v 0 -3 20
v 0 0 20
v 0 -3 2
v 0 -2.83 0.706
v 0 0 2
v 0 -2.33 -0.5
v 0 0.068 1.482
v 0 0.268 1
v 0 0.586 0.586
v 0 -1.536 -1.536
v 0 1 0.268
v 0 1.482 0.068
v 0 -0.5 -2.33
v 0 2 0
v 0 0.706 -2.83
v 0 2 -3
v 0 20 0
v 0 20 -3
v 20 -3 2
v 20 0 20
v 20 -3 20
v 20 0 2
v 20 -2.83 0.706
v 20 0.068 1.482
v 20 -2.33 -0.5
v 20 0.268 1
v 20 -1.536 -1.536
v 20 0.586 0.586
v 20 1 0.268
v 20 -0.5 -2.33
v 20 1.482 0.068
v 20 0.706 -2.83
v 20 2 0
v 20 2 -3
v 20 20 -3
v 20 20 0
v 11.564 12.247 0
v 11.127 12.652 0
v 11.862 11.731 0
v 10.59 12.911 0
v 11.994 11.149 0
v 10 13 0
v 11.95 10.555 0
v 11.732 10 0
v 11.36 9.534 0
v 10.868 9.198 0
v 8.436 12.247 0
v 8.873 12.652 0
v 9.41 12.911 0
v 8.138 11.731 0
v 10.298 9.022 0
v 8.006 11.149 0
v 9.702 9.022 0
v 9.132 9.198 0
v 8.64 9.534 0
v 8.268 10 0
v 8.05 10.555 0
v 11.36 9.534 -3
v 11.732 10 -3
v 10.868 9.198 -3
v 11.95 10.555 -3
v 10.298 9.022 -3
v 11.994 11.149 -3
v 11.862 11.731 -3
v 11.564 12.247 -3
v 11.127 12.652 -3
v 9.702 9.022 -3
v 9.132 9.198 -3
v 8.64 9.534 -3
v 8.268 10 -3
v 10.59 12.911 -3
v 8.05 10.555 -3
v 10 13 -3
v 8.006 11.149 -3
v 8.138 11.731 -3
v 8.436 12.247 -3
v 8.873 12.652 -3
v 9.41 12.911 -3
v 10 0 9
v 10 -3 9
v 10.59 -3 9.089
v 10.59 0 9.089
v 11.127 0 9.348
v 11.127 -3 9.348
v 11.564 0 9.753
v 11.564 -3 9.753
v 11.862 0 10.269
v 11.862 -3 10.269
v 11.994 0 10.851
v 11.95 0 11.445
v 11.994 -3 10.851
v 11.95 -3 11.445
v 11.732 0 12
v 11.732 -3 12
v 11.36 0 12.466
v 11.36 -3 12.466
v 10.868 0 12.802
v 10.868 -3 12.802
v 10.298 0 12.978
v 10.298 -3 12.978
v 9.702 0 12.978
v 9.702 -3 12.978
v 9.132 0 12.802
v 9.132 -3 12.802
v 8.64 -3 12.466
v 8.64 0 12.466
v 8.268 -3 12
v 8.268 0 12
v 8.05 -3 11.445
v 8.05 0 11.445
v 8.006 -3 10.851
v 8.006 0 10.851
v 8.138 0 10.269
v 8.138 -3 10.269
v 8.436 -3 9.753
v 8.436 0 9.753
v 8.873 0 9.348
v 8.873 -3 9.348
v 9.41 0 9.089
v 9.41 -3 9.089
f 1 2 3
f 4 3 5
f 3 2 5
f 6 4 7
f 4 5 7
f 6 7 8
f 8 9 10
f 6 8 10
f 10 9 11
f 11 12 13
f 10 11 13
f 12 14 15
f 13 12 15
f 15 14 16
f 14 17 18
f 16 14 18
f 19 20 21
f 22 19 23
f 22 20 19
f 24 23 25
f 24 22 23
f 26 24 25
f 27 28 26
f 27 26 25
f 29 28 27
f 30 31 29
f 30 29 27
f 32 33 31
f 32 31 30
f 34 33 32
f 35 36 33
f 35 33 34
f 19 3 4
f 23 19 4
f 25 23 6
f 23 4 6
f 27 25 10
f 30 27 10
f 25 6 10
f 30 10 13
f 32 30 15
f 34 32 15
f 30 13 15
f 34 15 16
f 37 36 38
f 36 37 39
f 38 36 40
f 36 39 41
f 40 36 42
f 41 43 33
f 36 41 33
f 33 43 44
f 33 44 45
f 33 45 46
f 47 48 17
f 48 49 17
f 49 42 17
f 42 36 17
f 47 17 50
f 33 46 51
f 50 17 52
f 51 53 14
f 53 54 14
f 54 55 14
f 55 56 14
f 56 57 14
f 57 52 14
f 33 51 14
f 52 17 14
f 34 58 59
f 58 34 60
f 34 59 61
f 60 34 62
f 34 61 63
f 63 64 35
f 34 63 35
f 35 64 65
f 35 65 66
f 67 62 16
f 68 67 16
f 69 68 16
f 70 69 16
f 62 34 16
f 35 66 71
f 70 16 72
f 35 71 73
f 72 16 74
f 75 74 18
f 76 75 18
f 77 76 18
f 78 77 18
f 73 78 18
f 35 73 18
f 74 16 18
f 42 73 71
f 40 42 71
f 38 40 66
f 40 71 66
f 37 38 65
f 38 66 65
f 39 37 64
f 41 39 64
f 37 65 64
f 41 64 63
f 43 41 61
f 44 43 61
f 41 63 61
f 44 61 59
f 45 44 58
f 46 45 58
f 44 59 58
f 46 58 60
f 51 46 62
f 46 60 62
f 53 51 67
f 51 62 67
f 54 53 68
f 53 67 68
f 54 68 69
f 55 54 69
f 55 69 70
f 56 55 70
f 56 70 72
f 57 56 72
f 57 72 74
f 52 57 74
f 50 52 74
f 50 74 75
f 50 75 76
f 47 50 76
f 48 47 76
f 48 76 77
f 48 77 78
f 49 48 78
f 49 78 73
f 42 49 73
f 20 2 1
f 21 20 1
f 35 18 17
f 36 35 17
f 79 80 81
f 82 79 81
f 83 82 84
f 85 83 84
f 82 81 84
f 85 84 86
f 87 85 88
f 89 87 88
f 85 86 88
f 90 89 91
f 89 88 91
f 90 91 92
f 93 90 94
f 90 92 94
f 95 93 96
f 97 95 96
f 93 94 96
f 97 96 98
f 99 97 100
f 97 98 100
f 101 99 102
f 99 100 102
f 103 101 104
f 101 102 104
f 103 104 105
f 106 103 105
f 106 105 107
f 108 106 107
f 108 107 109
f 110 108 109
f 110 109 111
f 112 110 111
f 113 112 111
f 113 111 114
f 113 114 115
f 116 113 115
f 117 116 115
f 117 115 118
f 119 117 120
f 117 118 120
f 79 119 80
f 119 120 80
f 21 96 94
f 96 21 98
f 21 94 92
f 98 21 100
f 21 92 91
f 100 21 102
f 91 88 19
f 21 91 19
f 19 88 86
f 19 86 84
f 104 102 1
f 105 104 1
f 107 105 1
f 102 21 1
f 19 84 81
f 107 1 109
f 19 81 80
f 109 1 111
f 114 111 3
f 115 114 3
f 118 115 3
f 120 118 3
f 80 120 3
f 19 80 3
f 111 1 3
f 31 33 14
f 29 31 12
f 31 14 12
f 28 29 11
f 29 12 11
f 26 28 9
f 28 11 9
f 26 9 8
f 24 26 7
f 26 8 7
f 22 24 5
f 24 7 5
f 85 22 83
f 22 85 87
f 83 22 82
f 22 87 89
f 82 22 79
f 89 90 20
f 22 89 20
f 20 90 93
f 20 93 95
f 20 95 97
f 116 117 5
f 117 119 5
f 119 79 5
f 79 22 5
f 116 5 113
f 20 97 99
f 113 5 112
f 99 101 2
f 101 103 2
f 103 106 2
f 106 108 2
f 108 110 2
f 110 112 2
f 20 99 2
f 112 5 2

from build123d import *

# Parameters (mm, degrees)
BASE_FLANGE1_DEPTH = 20
SKETCH6_R          = 2
CUT_EXTRUDE1_DEPTH = 10
SKETCH7_R          = 2
CUT_EXTRUDE2_DEPTH = 3


# Sheet-metal steps are written as plain solids
with BuildPart() as part:
    # Sketch1 → Base-Flange1 (new body)
    with BuildSketch(Plane(origin=(0, 0, 0), x_dir=(0, 0, -1), z_dir=(1, 0, 0))):
        with BuildLine():
            Line((0, 20), (0, 2))
            ThreePointArc((0, 2), (-0.585786438, 0.585786438), (-2, 0))
            Line((-2, 0), (-20, 0))
            Line((-20, 0), (-20, -3))
            Line((-20, -3), (-2, -3))
            ThreePointArc((-2, -3), (1.535533906, -1.535533906), (3, 2))
            Line((3, 2), (3, 20))
            Line((3, 20), (0, 20))
        make_face()
    extrude(amount=BASE_FLANGE1_DEPTH)

    # Sketch6 → Cut-Extrude1 (cut)
    with BuildSketch(Plane(origin=(0, 0, -3), x_dir=(-1, 0, 0), z_dir=(0, 0, -1))):
        with Locations(Location((-10, 11, 0), (0, 0, 90))):
            Circle(SKETCH6_R)
    extrude(amount=-CUT_EXTRUDE1_DEPTH, mode=Mode.SUBTRACT)

    # Sketch7 → Cut-Extrude2 (cut)
    with BuildSketch(Plane.XZ.offset(3)):
        with Locations(Location((10, 11, 0), (0, 0, 270))):
            Circle(SKETCH7_R)
    extrude(amount=-CUT_EXTRUDE2_DEPTH, mode=Mode.SUBTRACT)


solid = part.part
